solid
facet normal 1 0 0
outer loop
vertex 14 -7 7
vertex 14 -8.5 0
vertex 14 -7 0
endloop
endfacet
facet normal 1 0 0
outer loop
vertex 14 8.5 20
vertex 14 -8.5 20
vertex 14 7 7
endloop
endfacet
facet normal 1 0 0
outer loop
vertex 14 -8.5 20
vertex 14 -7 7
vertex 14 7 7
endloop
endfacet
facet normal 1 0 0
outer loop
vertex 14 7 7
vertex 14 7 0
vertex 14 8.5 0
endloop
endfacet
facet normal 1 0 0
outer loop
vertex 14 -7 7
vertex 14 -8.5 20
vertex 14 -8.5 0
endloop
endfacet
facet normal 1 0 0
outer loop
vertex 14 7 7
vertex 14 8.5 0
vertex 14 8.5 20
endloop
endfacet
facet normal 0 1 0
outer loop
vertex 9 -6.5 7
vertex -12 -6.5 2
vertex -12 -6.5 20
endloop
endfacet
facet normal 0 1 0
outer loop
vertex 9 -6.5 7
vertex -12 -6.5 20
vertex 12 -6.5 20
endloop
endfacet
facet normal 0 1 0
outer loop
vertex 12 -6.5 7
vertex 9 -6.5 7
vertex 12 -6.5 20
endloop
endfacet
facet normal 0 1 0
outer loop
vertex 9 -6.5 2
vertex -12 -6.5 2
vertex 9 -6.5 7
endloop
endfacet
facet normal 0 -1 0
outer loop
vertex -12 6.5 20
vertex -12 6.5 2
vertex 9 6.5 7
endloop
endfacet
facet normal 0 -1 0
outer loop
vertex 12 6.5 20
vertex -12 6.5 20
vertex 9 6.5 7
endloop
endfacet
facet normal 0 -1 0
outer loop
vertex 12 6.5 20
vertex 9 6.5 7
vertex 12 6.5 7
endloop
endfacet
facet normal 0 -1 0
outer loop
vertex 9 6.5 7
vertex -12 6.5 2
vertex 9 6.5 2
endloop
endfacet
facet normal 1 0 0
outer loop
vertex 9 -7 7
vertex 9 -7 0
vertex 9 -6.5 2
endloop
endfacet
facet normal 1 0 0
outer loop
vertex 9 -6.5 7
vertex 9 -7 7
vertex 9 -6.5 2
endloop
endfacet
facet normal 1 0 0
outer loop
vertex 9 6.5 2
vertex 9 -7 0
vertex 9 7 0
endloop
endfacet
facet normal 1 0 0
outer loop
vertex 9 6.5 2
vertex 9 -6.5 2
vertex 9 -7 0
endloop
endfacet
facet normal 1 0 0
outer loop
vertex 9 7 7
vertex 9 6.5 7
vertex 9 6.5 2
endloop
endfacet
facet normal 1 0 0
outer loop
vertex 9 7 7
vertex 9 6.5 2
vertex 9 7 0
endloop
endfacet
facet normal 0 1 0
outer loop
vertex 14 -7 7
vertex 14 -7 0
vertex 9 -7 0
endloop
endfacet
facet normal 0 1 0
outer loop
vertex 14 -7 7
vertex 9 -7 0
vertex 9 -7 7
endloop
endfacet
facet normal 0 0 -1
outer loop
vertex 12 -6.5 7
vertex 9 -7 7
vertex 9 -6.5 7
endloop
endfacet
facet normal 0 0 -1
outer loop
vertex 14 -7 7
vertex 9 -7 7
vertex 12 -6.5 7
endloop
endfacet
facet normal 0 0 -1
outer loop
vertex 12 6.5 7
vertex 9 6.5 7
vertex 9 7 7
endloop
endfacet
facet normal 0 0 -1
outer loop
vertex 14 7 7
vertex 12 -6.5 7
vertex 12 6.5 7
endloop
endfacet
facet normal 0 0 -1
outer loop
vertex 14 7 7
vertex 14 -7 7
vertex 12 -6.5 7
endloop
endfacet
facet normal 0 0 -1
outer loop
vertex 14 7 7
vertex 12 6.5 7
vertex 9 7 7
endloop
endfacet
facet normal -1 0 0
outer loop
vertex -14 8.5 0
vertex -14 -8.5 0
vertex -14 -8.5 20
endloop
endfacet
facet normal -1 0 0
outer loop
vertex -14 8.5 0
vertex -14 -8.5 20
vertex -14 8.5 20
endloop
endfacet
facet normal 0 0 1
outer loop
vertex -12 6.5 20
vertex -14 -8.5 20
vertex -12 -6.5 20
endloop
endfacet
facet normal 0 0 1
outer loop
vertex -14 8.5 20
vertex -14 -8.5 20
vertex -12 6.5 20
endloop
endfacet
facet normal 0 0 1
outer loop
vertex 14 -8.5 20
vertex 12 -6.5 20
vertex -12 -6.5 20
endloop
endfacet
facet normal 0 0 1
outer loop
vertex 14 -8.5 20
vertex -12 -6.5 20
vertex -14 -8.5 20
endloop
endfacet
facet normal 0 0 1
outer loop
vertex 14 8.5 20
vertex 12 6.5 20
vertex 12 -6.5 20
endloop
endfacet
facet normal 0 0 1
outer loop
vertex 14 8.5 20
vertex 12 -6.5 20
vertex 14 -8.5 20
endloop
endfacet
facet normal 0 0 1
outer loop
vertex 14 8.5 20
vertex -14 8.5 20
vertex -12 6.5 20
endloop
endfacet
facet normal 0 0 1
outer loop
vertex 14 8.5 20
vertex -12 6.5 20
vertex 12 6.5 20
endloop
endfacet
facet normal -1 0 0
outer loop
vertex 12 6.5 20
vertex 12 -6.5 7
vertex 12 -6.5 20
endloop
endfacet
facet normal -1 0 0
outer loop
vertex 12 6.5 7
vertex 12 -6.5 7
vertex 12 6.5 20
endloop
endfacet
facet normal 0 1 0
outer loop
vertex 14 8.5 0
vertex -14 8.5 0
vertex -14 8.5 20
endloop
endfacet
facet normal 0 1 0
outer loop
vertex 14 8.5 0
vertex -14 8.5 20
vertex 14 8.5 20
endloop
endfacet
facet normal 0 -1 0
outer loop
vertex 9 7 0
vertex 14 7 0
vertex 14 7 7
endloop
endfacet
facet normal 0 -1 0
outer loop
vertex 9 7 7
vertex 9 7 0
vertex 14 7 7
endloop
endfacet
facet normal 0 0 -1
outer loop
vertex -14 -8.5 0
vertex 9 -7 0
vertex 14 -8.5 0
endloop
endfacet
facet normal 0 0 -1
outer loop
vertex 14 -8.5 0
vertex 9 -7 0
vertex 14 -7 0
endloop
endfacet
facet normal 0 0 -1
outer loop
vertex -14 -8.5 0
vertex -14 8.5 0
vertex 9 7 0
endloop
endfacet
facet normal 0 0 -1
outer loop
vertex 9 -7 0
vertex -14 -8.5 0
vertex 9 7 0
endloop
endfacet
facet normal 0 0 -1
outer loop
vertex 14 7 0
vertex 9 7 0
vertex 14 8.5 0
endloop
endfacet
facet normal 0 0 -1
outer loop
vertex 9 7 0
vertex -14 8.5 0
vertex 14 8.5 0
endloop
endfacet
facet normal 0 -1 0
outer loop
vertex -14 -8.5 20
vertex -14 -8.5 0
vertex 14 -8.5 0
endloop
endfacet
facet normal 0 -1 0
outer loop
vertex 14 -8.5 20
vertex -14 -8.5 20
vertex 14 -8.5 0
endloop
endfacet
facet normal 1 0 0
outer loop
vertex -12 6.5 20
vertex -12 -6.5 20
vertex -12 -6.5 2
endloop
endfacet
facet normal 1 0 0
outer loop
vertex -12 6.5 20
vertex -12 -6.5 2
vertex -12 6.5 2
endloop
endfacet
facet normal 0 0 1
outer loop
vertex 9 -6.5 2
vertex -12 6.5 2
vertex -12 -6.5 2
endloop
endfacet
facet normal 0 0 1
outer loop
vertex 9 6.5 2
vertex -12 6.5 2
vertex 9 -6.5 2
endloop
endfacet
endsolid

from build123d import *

# Parameters (mm, degrees)
F0_W     = 28
F0_H     = 17
F1_DEPTH = 20
F2_T     = -2
F3_W     = 14
F3_H     = 5
F4_DEPTH = 5
F5_DEPTH = 2


with BuildPart() as f1:
    # F0 (on Top) → F1 (new body)
    with BuildSketch(Plane.XY):
        Rectangle(F0_W, F0_H)
    extrude(amount=F1_DEPTH)

    # F2
    f2_openings = [f1.faces().sort_by_distance(p)[0] for p in [
        (0, 0, 20),
    ]]
    offset(amount=F2_T, openings=f2_openings)

    # F3 (on face) → F4 (cut)
    with BuildSketch(Plane.YZ.offset(14)):
        with Locations((0, 2.5)):
            Rectangle(F3_W, F3_H)
    extrude(amount=-F4_DEPTH, mode=Mode.SUBTRACT)

    # F5 (cut): a face of the model
    f5_faces = [f1.faces().sort_by_distance(p)[0] for p in [
        (12.7580645161, 0, 5),
    ]]
    extrude(f5_faces, amount=-F5_DEPTH, mode=Mode.SUBTRACT)


solid = f1.part
